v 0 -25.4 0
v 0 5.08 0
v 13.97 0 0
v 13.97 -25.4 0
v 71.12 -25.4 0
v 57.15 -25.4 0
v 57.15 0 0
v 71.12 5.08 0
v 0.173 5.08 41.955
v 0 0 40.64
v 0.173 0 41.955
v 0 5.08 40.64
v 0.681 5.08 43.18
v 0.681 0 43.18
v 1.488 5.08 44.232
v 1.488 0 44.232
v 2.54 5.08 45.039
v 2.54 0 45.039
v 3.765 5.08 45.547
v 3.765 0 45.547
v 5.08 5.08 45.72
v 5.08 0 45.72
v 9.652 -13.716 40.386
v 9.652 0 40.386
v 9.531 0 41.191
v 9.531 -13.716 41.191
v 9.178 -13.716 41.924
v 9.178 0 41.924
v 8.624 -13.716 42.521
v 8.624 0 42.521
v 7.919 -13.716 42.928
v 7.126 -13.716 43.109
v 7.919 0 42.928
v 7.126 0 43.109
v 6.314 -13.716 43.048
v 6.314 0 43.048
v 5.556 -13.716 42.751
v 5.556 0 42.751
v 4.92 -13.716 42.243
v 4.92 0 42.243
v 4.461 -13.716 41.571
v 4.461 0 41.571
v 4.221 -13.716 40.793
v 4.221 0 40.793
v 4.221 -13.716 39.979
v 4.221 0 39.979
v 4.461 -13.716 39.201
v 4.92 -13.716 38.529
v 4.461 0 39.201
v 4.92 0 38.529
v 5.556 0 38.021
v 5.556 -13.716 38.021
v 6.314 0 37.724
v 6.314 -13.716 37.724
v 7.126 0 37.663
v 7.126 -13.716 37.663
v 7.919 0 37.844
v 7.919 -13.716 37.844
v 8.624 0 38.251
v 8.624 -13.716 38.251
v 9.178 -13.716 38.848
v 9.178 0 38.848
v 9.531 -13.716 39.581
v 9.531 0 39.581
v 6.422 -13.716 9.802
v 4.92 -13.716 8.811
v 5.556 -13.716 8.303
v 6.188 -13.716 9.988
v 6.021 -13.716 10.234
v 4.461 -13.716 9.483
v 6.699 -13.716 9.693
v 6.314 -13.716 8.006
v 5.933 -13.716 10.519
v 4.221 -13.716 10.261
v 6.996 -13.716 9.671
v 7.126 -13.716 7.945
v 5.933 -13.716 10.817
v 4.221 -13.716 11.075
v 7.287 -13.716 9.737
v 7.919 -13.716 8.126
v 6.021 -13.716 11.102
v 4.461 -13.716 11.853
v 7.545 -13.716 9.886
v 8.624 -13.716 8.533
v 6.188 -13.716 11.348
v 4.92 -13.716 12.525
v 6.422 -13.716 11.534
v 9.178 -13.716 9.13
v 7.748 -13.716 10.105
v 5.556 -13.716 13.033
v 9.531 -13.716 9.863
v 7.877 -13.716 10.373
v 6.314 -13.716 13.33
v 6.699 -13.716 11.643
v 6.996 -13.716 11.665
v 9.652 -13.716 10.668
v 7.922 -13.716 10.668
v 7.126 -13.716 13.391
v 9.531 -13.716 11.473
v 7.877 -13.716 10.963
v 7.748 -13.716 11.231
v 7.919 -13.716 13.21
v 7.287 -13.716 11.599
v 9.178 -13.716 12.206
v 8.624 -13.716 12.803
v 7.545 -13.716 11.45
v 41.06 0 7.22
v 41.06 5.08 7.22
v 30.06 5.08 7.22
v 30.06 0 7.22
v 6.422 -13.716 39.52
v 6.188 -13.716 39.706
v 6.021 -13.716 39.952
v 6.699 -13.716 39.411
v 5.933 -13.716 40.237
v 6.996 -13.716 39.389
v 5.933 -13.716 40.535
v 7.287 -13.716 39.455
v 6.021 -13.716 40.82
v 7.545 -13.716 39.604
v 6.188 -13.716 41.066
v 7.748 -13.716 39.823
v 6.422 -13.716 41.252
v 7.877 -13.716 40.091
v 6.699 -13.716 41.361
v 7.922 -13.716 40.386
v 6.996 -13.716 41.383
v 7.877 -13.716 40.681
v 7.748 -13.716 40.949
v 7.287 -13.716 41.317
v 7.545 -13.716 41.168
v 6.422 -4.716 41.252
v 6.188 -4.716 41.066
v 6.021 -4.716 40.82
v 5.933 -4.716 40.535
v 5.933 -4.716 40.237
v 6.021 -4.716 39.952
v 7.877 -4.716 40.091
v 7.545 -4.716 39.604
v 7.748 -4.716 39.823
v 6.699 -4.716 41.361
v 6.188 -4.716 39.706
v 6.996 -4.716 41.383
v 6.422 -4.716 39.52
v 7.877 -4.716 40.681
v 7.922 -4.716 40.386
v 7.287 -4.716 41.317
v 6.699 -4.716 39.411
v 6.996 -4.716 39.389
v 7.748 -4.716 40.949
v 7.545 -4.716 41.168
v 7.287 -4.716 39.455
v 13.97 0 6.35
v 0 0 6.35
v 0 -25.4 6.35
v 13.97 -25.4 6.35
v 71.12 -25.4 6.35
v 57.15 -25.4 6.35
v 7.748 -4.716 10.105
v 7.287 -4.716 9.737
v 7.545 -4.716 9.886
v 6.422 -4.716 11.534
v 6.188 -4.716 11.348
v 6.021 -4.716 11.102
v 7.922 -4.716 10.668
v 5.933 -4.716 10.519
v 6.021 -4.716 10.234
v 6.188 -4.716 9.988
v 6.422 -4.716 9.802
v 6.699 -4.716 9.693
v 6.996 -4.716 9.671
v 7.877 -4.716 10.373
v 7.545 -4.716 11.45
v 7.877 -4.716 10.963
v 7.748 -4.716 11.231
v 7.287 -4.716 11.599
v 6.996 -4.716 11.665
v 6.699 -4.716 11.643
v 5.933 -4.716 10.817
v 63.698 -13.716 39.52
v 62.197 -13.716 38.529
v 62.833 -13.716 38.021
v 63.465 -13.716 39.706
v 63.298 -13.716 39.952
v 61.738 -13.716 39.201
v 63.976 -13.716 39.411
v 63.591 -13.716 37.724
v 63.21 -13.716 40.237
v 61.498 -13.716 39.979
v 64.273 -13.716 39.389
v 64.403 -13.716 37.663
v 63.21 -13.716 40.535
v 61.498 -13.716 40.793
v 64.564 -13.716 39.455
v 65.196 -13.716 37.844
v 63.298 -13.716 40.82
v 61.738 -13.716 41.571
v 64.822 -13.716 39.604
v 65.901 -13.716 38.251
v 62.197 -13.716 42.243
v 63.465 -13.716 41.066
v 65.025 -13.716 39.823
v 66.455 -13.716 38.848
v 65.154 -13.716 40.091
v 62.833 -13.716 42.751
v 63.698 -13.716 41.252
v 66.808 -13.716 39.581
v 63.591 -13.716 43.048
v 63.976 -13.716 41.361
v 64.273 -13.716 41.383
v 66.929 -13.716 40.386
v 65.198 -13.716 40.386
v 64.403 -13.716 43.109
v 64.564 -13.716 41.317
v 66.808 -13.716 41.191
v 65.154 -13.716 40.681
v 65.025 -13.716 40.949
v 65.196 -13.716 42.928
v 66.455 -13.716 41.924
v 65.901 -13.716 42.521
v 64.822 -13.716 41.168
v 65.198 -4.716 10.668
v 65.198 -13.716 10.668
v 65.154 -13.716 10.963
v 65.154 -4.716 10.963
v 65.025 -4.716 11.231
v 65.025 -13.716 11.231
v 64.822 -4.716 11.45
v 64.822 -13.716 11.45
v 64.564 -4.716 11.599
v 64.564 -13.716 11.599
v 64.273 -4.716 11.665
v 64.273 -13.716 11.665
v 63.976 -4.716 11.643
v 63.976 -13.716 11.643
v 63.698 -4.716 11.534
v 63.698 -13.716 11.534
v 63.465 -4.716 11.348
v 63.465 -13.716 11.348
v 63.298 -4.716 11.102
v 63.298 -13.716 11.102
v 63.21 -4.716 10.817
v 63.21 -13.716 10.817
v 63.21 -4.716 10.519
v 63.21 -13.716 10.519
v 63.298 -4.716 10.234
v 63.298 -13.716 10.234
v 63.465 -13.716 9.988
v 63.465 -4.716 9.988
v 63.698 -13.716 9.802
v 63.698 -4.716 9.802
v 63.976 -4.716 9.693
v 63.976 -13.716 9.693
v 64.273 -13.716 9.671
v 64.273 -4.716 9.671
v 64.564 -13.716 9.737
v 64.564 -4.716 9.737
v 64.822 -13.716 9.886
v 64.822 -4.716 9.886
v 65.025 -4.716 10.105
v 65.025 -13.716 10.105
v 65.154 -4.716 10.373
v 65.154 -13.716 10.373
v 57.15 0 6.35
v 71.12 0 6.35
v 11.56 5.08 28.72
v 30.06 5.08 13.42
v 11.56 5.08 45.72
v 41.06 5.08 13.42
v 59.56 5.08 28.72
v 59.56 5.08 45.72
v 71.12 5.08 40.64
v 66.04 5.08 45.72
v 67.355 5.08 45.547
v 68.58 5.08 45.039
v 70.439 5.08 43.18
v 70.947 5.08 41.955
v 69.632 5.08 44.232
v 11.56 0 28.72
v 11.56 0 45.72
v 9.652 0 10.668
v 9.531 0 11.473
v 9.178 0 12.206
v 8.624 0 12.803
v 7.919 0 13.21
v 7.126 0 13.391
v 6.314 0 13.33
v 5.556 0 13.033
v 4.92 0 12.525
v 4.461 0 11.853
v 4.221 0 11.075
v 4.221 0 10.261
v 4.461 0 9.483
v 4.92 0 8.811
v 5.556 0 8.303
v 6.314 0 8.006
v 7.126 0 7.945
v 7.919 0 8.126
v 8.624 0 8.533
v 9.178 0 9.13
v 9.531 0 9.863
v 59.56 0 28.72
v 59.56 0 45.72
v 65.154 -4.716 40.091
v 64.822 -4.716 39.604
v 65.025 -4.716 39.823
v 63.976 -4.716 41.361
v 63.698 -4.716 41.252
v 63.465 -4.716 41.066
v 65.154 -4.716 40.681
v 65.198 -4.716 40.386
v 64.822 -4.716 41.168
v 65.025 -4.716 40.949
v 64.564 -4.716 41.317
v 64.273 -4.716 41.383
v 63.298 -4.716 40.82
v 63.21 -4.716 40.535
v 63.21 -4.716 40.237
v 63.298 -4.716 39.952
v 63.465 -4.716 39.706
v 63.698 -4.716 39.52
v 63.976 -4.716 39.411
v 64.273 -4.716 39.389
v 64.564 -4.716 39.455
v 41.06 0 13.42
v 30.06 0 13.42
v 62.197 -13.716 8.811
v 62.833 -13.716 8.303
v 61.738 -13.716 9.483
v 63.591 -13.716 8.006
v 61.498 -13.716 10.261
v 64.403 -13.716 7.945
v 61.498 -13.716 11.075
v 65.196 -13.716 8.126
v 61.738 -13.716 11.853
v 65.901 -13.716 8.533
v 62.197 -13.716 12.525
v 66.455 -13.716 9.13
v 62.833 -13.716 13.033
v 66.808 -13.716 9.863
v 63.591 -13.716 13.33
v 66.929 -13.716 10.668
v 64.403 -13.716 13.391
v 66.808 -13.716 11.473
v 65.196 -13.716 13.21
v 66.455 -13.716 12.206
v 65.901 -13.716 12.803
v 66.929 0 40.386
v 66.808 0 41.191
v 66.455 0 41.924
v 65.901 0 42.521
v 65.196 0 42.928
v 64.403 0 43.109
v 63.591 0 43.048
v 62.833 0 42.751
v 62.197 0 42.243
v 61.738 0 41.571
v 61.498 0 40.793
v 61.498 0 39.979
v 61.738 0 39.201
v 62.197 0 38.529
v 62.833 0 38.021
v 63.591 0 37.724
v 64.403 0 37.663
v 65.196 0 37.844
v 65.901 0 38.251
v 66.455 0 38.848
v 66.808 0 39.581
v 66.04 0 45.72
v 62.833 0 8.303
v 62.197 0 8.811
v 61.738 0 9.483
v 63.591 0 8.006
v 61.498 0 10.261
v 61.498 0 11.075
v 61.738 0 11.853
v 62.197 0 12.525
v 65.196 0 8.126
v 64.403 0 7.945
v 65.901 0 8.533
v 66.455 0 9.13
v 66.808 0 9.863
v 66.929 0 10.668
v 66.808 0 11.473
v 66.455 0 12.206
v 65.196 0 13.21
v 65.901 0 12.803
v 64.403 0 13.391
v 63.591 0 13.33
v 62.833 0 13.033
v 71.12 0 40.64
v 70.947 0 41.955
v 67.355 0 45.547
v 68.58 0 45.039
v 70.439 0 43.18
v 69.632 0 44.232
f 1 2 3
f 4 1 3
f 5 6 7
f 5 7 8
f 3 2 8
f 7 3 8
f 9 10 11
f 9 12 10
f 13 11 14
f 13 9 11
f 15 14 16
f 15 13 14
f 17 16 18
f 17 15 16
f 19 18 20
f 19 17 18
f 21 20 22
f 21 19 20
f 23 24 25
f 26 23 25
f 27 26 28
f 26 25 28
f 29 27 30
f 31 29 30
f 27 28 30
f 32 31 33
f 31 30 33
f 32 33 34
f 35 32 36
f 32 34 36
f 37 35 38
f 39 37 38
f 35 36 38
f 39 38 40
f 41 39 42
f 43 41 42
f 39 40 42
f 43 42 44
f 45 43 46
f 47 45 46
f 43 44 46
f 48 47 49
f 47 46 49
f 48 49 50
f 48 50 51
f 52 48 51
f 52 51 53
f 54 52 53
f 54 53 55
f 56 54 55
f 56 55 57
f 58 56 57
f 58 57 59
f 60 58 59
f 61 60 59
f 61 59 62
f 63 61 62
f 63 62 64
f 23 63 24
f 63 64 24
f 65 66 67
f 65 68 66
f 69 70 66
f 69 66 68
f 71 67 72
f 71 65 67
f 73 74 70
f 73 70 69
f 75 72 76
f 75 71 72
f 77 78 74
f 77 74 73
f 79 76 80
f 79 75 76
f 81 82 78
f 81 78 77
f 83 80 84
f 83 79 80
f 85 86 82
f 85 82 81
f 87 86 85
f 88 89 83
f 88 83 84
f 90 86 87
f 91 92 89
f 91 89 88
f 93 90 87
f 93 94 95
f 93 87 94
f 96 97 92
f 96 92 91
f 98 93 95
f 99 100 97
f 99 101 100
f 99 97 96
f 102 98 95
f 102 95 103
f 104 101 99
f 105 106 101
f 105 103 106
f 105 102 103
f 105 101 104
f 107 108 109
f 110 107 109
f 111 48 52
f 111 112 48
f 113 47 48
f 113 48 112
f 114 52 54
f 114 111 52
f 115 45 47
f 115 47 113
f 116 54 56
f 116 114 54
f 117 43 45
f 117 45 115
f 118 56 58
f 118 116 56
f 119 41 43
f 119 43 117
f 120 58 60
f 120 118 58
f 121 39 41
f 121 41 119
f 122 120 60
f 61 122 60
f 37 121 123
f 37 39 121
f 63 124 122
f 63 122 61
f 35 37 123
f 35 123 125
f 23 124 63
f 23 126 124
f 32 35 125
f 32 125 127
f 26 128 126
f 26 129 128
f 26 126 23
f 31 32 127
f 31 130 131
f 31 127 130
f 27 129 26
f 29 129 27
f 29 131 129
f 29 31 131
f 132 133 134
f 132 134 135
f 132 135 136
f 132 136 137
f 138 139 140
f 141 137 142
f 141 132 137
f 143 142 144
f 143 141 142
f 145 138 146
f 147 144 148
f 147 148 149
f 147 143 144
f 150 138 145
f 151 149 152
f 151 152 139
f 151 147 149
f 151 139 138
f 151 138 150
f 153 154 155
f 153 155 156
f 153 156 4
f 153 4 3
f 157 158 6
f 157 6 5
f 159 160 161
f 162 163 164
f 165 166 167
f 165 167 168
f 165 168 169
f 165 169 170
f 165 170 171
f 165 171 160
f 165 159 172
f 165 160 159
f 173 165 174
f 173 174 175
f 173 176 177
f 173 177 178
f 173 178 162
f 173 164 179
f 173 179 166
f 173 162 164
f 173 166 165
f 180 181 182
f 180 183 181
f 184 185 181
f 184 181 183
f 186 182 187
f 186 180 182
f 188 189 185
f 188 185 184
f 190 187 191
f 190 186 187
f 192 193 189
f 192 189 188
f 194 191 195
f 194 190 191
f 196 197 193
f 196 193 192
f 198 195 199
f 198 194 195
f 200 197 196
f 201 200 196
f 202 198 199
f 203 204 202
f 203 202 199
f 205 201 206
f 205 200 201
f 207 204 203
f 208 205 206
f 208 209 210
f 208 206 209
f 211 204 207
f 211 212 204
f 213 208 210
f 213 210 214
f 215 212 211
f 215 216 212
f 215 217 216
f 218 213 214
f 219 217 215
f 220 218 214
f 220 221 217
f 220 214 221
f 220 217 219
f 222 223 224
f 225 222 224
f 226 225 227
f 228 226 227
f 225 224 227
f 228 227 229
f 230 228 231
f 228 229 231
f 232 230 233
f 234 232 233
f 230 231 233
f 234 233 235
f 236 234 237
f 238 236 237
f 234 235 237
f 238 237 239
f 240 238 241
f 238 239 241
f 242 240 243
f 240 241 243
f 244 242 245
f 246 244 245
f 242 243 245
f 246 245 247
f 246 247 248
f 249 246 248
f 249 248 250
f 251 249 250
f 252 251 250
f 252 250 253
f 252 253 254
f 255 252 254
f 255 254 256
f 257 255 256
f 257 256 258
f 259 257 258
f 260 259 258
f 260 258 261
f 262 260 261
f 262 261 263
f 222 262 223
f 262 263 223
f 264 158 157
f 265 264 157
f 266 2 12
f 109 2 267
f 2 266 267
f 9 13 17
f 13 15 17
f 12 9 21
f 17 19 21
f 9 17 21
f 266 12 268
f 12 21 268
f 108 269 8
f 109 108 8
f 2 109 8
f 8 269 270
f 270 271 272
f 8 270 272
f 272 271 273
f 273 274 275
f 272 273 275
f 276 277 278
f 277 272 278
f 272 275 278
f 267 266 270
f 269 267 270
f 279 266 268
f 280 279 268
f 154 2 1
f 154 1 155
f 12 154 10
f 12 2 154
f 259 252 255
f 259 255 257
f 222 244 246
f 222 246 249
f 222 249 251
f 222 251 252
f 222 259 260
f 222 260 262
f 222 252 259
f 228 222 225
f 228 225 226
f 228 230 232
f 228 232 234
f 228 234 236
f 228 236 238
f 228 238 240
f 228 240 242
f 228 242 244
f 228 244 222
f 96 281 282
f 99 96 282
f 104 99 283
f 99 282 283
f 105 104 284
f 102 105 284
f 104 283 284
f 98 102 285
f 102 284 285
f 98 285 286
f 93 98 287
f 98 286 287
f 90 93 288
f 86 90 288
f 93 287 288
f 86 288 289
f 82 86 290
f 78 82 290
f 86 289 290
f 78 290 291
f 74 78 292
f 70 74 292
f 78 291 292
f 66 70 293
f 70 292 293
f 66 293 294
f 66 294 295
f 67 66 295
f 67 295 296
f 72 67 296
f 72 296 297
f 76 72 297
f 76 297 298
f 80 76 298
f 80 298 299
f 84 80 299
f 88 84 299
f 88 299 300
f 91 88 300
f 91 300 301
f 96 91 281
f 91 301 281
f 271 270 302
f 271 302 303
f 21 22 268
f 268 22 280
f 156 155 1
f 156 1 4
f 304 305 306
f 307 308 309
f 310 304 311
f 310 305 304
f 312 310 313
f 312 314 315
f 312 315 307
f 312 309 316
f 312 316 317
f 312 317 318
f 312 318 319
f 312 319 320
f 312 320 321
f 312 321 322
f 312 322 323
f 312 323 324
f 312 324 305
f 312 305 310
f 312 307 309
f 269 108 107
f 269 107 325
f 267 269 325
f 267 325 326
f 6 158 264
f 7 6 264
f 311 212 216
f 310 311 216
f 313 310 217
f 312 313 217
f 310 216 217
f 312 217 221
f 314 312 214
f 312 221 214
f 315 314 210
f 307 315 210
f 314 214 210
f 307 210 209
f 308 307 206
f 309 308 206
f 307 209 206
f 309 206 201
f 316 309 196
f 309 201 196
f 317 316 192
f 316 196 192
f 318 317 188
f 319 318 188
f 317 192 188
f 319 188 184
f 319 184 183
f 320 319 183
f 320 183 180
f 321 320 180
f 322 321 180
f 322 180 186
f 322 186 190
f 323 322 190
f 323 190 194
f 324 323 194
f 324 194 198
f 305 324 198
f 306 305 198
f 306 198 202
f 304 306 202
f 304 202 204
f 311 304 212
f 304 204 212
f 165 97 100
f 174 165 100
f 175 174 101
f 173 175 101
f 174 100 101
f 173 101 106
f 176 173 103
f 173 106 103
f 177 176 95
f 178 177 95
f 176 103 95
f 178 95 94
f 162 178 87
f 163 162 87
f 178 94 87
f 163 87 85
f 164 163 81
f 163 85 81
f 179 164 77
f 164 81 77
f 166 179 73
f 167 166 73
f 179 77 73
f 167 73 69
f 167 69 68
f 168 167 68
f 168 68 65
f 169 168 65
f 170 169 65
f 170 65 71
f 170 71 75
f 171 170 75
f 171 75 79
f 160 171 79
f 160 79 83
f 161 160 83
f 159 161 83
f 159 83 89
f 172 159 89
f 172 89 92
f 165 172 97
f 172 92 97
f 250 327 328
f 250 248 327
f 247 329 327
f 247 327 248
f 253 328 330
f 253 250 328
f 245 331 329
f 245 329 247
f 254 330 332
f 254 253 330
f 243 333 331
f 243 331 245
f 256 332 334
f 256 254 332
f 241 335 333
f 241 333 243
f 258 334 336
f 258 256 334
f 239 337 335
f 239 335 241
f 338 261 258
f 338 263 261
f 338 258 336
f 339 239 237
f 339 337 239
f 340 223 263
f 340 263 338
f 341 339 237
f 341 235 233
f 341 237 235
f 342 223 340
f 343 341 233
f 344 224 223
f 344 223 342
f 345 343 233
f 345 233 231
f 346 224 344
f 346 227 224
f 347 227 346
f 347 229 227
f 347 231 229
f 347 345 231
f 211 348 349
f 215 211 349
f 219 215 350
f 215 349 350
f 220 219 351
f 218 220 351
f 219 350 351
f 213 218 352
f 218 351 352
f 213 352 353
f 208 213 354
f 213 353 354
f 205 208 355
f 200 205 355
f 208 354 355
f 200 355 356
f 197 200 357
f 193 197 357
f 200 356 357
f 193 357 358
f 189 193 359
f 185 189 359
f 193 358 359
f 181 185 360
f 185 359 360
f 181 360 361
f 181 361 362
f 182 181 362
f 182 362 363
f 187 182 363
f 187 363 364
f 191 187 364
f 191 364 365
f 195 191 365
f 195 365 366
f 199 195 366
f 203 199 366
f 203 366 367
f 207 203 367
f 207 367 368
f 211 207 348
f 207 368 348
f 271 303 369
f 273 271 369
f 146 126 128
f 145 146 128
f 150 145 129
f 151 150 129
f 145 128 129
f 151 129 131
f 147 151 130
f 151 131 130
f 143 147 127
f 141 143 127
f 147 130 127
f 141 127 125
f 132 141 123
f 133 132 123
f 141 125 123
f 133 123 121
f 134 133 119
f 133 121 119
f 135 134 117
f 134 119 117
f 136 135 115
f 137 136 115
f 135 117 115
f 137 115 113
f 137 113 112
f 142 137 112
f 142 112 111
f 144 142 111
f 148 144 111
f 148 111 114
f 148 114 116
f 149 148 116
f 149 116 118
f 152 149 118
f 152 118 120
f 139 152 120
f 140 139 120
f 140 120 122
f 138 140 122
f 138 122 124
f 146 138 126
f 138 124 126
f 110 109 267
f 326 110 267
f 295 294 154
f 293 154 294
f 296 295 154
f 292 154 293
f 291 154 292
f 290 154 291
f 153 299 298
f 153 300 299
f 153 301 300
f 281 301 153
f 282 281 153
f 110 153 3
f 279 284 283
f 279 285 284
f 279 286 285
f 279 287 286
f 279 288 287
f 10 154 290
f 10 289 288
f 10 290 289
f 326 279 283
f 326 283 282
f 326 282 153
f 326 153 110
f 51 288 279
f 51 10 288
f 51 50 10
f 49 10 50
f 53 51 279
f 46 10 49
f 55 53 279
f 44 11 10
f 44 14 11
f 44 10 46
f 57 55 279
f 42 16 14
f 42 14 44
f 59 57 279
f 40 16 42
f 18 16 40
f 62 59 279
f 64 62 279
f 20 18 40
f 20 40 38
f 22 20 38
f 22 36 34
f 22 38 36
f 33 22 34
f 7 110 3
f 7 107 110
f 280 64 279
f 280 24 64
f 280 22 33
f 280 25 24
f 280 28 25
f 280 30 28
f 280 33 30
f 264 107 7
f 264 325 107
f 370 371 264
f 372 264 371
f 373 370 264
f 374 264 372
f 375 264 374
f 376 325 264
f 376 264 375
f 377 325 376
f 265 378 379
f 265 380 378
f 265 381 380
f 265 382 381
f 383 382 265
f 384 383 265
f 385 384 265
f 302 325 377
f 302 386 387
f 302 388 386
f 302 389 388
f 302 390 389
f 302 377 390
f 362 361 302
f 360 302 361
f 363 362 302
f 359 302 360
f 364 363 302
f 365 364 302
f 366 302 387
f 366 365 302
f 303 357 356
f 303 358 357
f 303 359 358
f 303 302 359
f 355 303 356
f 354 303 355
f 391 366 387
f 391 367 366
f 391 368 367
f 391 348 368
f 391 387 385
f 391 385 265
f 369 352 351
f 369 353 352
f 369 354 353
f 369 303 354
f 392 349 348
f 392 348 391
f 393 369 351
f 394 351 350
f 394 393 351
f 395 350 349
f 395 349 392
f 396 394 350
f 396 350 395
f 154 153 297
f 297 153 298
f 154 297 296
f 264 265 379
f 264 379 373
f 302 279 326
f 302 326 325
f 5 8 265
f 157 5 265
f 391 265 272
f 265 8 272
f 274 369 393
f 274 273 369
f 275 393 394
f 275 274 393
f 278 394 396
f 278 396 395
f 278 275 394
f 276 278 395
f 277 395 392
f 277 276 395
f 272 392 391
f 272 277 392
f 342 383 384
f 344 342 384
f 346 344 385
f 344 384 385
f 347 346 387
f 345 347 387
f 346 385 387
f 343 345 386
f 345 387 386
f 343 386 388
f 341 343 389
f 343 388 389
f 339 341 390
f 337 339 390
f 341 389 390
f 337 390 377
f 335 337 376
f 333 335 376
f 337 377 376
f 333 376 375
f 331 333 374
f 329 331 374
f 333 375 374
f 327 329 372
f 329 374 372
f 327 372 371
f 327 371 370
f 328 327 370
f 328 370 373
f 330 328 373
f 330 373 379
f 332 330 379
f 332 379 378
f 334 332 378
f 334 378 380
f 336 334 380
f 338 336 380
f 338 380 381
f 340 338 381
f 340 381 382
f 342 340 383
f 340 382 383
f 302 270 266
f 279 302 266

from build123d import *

# Parameters (mm, degrees)
F0_R      = 2.7305
F1_DEPTH  = 13.716
F0_W      = 71.12
F0_H      = 39.37
F0_H_2    = 6.35
F2_DEPTH  = 5.08
F3_DEPTH  = 25.4
F4_W      = 43.18
F4_H      = 25.4
F5_DEPTH  = 6.351
F6_R      = 1
F7_DEPTH  = 9
F8_R      = 5.08
F9_W      = 48
F9_H      = 17
F9_W_2    = 11
F9_H_2    = 6.2
F10_DEPTH = 25.4


with BuildPart() as f1:
    # F0 (on Front) → F1 (new body)
    with BuildSketch(Plane.XZ):
        with Locations((6.9215, 40.386)):
            Circle(F0_R)
    extrude(amount=F1_DEPTH)



with BuildPart() as f1b:
    # F0 (on Front) → F1, piece 2 (new body)
    with BuildSketch(Plane.XZ):
        with Locations((6.9215, 10.668)):
            Circle(F0_R)
    extrude(amount=F1_DEPTH)


with BuildPart() as f1c:
    # F0 (on Front) → F1, piece 3 (new body)
    with BuildSketch(Plane.XZ):
        with Locations((64.1985, 10.668)):
            Circle(F0_R)
    extrude(amount=F1_DEPTH)


with BuildPart() as f1d:
    # F0 (on Front) → F1, piece 4 (new body)
    with BuildSketch(Plane.XZ):
        with Locations((64.1985, 40.386)):
            Circle(F0_R)
    extrude(amount=F1_DEPTH)


with BuildPart() as f1_1:
    add(f1.part)

    add(f1b.part)  # F2 merges F1b

    add(f1c.part)  # F2 merges F1c

    add(f1d.part)  # F2 merges F1d
    # F0 (on Front) → F2 (join)
    with BuildSketch(Plane.XZ):
        with Locations((35.56, 26.035)):
            Rectangle(F0_W, F0_H)
        with Locations((6.9215, 10.668)):
            Circle(F0_R, mode=Mode.SUBTRACT)
        with Locations((64.1985, 10.668)):
            Circle(F0_R, mode=Mode.SUBTRACT)
        with Locations((6.9215, 40.386)):
            Circle(F0_R, mode=Mode.SUBTRACT)
        with Locations((64.1985, 40.386)):
            Circle(F0_R, mode=Mode.SUBTRACT)
        with Locations((35.56, 3.175)):
            Rectangle(F0_W, F0_H_2)
        with Locations((64.1985, 40.386)):
            Circle(F0_R)
        with Locations((6.9215, 40.386)):
            Circle(F0_R)
        with Locations((6.9215, 10.668)):
            Circle(F0_R)
        with Locations((64.1985, 10.668)):
            Circle(F0_R)
    extrude(amount=-F2_DEPTH)

    # F0 (on Front) → F3 (join)
    with BuildSketch(Plane.XZ):
        with Locations((35.56, 3.175)):
            Rectangle(F0_W, F0_H_2)
    extrude(amount=F3_DEPTH)

    # F4 (on face) → F5 (cut, through all)
    with BuildSketch(Plane.XY.offset(6.35)):
        with Locations((35.56, -12.7)):
            Rectangle(F4_W, F4_H)
    extrude(amount=-F5_DEPTH, mode=Mode.SUBTRACT)

    # F6 (on face) → F7 (cut)
    with BuildSketch(Plane.XZ.offset(13.716)):
        with Locations((6.9215, 10.668)):
            Circle(F6_R)
        with Locations((6.9215, 40.386)):
            Circle(F6_R)
        with Locations((64.1985, 40.386)):
            Circle(F6_R)
        with Locations((64.1985, 10.668)):
            Circle(F6_R)
    extrude(amount=-F7_DEPTH, mode=Mode.SUBTRACT)

    # F8
    f8_edges = [f1_1.edges().sort_by_distance(p)[0] for p in [
        (0, 2.54, 45.72),
        (71.12, 2.54, 45.72),
    ]]
    fillet(f8_edges, radius=F8_R)

    # F9 (on face) → F10 (cut)
    with BuildSketch(Plane(origin=(0, 5.08, 0), x_dir=(-1, 0, 0), z_dir=(0, 1, 0))):
        with Locations((-35.56, 37.22)):
            Rectangle(F9_W, F9_H)
        with Locations((-35.56, 10.32)):
            Rectangle(F9_W_2, F9_H_2)
    extrude(amount=-F10_DEPTH, mode=Mode.SUBTRACT)


solid = f1_1.part
